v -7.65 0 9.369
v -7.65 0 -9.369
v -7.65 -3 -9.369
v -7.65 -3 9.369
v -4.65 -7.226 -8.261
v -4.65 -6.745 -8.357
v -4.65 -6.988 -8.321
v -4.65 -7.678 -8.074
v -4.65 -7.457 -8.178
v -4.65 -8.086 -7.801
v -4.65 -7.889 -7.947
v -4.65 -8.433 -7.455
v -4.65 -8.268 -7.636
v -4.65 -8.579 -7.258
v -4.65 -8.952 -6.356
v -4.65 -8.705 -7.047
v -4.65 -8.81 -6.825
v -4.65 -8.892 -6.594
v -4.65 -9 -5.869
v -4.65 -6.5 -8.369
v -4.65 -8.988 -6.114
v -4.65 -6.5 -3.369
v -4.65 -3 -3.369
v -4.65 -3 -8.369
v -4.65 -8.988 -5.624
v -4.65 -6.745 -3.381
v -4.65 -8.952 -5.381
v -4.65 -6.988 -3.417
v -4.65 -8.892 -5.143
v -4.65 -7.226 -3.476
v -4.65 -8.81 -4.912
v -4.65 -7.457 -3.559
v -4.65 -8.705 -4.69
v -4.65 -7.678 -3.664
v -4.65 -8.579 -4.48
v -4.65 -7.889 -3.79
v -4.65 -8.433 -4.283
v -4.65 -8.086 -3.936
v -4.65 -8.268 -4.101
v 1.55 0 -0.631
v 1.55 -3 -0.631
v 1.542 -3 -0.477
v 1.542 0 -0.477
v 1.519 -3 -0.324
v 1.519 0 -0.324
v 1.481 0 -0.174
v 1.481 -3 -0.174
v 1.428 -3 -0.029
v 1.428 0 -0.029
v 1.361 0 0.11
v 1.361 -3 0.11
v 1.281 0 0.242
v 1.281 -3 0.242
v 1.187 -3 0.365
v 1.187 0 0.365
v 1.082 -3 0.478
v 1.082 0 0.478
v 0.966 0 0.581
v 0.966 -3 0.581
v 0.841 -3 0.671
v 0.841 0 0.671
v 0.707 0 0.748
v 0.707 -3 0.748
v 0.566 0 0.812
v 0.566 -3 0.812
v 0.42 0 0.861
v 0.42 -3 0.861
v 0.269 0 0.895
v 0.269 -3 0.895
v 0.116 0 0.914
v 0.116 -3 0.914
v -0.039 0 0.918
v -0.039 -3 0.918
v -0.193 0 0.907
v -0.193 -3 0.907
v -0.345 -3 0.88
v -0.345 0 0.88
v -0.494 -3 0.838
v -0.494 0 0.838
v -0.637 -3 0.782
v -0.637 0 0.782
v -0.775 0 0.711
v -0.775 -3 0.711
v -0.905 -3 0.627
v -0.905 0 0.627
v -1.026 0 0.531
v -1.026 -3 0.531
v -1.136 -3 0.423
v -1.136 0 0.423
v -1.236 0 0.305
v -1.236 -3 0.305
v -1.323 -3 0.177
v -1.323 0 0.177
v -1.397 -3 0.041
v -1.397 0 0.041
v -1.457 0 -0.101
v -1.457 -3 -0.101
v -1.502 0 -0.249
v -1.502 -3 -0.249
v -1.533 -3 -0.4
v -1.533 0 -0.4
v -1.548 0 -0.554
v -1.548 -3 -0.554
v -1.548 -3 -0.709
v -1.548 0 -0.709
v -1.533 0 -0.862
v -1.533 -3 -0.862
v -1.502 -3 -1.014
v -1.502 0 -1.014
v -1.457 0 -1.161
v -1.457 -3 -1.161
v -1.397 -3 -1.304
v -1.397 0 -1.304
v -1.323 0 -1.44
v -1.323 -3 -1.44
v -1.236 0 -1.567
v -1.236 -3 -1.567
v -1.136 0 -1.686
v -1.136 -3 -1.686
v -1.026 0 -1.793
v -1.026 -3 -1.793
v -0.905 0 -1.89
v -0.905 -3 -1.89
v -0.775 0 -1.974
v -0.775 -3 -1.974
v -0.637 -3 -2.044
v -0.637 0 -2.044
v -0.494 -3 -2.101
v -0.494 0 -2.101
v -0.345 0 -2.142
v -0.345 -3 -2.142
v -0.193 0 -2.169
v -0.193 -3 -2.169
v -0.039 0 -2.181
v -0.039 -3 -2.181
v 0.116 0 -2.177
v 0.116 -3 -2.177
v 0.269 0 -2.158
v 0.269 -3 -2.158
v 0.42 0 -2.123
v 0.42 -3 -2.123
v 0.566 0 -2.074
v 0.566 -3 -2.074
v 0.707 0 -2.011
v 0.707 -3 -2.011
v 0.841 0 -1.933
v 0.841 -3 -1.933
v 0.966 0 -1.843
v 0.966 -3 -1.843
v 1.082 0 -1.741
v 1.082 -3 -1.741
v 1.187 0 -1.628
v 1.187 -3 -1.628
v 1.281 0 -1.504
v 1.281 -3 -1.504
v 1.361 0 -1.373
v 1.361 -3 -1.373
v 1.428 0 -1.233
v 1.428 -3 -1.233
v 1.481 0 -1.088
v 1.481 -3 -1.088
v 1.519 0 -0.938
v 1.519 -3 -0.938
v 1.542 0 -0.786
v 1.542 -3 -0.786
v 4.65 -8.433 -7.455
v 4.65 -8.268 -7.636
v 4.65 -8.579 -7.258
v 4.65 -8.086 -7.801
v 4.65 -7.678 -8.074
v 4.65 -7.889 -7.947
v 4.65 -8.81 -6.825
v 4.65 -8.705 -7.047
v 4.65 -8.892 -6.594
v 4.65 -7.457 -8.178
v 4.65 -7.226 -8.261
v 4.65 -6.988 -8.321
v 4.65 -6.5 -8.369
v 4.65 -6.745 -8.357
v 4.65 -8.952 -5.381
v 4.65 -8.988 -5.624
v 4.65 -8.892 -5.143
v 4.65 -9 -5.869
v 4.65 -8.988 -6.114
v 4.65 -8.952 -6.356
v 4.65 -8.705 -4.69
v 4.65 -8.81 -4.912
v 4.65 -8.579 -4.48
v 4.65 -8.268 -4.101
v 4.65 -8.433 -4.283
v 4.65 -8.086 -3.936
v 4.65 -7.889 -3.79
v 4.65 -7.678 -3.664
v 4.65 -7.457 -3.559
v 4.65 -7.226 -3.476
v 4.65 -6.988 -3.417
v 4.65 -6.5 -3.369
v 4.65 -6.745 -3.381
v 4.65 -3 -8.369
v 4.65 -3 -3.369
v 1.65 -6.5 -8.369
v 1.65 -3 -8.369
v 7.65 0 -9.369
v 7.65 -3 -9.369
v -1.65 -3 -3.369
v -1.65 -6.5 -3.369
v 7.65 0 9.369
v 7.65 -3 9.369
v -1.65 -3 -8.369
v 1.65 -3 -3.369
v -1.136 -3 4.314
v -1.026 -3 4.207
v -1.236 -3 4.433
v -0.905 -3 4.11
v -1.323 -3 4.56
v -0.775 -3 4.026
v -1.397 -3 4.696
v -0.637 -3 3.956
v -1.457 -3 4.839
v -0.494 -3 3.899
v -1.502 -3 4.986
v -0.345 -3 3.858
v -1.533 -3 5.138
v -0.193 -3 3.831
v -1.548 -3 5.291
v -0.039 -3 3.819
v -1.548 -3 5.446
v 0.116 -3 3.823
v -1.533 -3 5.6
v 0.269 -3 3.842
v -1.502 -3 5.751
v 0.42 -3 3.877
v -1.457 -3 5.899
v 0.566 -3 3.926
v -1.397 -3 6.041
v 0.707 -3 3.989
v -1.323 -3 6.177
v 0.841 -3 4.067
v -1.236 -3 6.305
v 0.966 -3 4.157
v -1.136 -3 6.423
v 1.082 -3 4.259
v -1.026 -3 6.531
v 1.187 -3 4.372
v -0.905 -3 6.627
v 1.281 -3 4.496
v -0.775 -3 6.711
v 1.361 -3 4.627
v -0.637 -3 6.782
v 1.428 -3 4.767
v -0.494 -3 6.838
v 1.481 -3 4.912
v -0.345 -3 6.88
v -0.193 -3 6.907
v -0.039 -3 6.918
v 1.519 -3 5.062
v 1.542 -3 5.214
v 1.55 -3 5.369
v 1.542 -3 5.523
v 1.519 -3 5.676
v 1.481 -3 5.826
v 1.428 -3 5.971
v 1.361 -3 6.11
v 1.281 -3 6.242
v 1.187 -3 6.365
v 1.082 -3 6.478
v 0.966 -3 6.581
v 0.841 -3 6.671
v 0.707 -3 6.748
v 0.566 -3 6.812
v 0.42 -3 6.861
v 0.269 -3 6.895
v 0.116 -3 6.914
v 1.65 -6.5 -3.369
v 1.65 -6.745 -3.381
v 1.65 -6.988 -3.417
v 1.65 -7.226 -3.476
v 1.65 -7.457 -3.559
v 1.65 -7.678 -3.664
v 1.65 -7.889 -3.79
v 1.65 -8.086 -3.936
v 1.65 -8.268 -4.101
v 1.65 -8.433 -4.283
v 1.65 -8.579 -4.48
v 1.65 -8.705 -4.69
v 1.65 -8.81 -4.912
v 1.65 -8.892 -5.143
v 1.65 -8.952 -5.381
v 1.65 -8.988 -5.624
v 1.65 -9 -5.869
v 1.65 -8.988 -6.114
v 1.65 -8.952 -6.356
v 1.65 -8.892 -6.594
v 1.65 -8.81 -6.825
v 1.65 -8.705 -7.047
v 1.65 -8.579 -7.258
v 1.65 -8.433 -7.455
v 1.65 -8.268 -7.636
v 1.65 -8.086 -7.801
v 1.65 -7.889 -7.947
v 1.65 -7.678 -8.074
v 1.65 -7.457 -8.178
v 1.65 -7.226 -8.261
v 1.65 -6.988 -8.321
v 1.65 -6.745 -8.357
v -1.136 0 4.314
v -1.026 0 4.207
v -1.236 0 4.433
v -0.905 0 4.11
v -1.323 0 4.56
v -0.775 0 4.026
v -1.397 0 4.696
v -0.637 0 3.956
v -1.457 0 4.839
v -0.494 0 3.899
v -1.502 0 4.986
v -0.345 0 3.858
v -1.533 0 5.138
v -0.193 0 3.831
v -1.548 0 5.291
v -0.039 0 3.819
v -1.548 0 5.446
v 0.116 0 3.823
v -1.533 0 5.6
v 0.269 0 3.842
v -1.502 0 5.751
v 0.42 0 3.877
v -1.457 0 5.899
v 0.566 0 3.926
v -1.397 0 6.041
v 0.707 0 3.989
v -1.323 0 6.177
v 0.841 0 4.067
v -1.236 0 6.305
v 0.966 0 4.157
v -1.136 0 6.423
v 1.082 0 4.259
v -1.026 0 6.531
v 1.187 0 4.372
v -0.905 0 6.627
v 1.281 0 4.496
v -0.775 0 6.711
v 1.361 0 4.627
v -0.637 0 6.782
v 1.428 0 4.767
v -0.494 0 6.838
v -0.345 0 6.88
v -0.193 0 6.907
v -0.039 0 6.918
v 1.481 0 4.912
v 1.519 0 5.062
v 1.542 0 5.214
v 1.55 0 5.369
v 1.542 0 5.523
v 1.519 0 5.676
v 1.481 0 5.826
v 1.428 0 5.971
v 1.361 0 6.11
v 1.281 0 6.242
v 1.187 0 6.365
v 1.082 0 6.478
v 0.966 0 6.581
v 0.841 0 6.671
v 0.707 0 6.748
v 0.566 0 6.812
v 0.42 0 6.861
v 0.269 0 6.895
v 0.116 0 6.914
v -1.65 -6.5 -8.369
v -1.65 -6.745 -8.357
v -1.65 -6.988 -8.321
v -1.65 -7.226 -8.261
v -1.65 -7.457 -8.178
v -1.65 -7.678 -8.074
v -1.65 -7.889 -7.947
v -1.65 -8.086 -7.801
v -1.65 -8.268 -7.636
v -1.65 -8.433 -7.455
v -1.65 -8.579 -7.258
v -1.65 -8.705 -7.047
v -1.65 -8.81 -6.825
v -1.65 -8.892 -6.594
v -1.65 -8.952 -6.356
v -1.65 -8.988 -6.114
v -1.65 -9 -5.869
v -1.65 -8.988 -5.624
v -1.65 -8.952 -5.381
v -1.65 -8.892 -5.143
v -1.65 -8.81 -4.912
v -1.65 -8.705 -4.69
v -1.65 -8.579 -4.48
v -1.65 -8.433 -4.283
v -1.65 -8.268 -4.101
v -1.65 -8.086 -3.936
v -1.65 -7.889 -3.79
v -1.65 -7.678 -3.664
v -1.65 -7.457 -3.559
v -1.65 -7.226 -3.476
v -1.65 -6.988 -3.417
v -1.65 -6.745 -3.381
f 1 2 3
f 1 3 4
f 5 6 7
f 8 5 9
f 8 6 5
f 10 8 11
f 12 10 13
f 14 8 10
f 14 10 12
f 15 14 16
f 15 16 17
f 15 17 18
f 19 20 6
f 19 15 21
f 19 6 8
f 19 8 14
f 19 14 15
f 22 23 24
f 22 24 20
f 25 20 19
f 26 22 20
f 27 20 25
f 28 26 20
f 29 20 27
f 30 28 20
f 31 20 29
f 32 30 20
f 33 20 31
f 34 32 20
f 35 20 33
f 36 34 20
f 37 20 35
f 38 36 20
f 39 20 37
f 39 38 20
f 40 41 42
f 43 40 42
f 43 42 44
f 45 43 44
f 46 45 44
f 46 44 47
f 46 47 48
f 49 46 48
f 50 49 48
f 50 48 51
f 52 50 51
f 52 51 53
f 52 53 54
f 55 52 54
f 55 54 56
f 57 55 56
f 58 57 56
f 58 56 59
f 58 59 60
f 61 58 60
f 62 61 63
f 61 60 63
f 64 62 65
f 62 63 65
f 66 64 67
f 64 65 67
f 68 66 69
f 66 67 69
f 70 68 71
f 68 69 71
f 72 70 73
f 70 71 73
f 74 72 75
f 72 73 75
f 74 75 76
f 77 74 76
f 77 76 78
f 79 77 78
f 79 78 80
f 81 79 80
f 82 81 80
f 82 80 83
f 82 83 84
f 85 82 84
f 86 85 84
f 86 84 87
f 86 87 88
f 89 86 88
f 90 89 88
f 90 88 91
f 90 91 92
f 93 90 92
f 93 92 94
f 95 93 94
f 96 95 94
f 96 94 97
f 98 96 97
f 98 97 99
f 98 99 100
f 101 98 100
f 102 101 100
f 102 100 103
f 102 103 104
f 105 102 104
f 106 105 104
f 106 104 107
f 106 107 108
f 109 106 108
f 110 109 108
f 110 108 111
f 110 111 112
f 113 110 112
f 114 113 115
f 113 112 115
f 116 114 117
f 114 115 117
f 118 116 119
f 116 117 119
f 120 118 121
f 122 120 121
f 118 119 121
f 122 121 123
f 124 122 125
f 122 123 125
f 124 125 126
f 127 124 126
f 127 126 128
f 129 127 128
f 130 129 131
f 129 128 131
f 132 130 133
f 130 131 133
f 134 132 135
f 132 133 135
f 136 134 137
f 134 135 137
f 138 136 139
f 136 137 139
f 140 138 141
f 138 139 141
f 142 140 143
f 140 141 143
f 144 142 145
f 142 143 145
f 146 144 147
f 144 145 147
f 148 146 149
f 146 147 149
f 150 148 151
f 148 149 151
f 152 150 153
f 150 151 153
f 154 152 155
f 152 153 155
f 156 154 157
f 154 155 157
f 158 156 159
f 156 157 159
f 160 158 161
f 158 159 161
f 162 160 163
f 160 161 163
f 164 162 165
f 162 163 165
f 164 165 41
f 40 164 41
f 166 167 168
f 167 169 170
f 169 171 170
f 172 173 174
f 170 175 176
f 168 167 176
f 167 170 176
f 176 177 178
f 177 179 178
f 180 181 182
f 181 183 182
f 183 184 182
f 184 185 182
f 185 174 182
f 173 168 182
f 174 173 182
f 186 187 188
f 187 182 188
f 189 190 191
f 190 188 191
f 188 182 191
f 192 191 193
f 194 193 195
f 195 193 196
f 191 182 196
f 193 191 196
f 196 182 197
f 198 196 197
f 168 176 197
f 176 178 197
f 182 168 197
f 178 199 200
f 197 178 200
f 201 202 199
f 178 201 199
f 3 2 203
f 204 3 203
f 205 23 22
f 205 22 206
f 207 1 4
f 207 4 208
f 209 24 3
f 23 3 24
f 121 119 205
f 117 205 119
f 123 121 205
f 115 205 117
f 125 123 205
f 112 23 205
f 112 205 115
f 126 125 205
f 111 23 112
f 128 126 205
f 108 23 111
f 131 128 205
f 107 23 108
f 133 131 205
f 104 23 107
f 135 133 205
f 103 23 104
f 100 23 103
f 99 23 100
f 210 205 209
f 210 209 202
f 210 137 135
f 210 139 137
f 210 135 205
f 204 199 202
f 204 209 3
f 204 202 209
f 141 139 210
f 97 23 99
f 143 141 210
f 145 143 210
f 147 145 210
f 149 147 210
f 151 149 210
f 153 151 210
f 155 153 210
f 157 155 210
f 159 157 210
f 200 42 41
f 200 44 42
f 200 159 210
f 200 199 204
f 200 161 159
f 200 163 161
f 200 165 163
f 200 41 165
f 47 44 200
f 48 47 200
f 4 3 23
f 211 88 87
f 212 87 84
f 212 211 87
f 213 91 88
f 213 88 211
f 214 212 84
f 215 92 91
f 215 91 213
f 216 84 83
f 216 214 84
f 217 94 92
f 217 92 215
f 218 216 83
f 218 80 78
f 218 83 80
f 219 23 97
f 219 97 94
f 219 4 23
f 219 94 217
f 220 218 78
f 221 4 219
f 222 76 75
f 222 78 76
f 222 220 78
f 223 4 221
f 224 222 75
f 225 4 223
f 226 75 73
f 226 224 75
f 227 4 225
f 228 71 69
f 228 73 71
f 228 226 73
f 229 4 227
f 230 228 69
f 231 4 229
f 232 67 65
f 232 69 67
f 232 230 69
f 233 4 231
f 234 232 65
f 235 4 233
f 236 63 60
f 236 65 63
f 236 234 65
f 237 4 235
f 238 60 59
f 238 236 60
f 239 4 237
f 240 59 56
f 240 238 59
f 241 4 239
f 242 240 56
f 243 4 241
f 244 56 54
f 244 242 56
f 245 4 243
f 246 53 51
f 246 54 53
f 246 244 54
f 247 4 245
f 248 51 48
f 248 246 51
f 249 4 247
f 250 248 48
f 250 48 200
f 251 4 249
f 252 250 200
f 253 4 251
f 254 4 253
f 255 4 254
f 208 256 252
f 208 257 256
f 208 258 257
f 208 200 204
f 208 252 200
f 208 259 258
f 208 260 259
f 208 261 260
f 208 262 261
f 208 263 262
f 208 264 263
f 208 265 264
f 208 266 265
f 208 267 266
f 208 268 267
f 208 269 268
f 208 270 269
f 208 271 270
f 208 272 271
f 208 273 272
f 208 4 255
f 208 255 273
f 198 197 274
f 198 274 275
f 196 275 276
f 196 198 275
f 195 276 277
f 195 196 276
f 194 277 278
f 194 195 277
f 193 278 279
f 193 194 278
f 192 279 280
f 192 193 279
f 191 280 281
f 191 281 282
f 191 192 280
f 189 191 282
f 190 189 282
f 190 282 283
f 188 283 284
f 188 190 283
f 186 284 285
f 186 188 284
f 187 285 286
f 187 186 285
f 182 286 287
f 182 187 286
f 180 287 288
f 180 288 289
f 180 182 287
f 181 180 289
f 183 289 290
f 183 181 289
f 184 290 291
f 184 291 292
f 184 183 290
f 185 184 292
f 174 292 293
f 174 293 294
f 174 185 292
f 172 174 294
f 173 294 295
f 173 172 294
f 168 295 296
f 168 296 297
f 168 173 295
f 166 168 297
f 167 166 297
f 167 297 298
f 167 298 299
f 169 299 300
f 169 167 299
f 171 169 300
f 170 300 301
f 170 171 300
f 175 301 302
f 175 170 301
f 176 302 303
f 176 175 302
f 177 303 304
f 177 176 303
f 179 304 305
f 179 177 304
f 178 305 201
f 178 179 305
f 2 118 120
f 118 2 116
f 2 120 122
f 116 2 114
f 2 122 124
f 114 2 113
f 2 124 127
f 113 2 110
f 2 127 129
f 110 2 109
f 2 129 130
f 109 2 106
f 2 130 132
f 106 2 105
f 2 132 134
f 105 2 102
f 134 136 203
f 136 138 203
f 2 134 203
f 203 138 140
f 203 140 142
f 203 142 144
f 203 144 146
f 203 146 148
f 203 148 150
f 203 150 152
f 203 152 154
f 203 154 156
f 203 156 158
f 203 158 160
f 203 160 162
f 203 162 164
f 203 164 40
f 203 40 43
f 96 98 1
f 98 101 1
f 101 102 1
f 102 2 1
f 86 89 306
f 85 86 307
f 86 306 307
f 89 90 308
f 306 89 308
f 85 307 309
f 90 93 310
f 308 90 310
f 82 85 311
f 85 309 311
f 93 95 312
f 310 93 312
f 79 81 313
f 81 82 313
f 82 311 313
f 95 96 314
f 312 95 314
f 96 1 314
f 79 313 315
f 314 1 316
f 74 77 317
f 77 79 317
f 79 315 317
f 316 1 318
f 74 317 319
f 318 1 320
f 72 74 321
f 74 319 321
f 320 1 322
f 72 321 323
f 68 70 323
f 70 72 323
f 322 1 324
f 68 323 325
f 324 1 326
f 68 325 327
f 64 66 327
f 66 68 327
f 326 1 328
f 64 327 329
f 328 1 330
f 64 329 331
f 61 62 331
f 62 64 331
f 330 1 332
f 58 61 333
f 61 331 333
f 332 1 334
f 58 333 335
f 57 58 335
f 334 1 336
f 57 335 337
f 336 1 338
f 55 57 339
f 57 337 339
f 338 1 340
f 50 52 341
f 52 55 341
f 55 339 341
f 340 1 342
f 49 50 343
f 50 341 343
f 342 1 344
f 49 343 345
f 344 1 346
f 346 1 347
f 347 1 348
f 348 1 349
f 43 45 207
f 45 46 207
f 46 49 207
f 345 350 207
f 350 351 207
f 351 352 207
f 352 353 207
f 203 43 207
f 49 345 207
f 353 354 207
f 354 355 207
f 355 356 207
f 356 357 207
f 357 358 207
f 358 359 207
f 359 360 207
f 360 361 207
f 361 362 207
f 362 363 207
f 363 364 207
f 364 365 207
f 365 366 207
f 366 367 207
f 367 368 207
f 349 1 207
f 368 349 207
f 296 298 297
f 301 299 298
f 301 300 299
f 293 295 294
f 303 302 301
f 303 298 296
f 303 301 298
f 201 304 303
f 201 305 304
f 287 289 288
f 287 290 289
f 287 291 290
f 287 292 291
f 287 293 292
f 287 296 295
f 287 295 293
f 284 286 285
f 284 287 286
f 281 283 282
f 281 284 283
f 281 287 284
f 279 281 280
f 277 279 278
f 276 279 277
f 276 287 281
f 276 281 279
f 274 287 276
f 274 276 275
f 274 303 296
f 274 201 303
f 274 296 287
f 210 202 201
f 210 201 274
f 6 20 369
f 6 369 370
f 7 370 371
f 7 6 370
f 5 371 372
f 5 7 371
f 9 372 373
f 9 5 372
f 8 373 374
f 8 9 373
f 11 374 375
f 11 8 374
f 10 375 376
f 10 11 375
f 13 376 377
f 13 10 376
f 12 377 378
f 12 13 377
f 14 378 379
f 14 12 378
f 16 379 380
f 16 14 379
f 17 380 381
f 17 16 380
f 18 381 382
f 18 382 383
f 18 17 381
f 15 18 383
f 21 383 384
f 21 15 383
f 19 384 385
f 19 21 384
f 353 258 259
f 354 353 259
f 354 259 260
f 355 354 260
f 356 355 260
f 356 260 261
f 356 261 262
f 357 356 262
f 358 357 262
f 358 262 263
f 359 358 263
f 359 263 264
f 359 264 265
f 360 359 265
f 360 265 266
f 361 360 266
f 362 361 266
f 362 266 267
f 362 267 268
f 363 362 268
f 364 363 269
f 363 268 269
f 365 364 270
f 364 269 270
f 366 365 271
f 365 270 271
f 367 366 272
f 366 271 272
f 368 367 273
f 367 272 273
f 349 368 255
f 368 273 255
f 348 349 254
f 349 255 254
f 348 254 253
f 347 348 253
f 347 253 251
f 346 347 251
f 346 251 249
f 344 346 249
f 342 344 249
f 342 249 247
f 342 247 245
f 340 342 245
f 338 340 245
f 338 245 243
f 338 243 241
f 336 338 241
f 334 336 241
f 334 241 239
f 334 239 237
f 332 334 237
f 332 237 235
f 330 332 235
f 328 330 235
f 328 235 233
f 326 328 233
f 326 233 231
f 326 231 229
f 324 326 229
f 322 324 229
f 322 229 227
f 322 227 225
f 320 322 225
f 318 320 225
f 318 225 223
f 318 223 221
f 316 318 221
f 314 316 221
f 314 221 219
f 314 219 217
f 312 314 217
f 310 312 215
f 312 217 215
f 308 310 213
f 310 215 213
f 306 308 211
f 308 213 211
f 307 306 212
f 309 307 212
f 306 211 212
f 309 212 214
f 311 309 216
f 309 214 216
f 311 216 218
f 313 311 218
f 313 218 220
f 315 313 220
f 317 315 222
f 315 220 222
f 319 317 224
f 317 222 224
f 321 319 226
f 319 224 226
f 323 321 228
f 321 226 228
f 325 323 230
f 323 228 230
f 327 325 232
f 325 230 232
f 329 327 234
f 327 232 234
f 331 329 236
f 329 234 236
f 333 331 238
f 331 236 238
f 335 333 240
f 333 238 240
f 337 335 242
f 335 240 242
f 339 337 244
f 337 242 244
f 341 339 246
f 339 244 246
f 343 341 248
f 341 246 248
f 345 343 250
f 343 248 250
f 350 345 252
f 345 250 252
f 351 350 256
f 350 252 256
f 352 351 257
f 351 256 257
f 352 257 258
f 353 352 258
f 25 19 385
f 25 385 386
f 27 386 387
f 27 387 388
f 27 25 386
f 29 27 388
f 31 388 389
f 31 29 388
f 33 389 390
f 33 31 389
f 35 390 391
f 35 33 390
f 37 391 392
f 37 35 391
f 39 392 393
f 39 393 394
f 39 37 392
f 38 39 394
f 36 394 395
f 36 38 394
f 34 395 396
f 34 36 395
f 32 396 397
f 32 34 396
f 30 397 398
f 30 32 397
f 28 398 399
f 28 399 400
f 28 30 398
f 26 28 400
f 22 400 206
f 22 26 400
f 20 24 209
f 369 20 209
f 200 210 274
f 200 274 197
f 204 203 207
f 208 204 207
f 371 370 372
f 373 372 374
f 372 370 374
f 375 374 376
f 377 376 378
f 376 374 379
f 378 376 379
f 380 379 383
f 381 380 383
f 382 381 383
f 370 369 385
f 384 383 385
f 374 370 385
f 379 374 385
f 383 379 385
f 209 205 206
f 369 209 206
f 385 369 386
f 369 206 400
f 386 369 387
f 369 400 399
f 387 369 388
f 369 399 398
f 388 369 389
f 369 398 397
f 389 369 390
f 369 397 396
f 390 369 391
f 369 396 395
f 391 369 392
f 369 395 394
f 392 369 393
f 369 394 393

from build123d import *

# Parameters (mm, degrees)
F0_W     = 15.3
F0_H     = 18.7374445884
F1_DEPTH = 3
F2_W     = 3
F2_H     = 5
F3_DEPTH = 3.5
F5_R     = 1.55
F6_DEPTH = 5
F7_DEPTH = 3
F9_DEPTH = 3


with BuildPart() as f1:
    # F0 (on Front) → F1 (new body)
    with BuildSketch(Plane.XZ):
        Rectangle(F0_W, F0_H)
    extrude(amount=F1_DEPTH)

    # F2 (on face) → F3 (join)
    with BuildSketch(Plane.XZ.offset(3)):
        with Locations((-3.15, -5.8687222942)):
            Rectangle(F2_W, F2_H)
        with Locations((3.15, -5.8687222942)):
            Rectangle(F2_W, F2_H)
    extrude(amount=F3_DEPTH)

    # F5 (on face) → F6 (cut)
    with BuildSketch(Plane.XZ.offset(3)):
        with Locations((0, -0.6312777058)):
            Circle(F5_R)
        with Locations((0, 5.3687222942)):
            Circle(F5_R)
    extrude(amount=-F6_DEPTH, mode=Mode.SUBTRACT)

    # F4 (on face) → F7 (join)
    with BuildSketch(Plane(origin=(-4.65, 0, 0), x_dir=(0, -1, 0), z_dir=(-1, 0, 0))):
        with BuildLine():
            ThreePointArc((6.5, -8.3687222942), (8.267766953, -7.6364892472), (9, -5.8687222942))
            ThreePointArc((9, -5.8687222942), (8.267766953, -4.1009553413), (6.5, -3.3687222942))
            Line((6.5, -3.3687222942), (6.5, -8.3687222942))
        make_face()
    extrude(amount=-F7_DEPTH)

    # F8 (on face) → F9 (join)
    with BuildSketch(Plane.YZ.offset(4.65)):
        with BuildLine():
            ThreePointArc((-6.5, -8.3687222942), (-4.732233047, -7.6364892472), (-4, -5.8687222942))
            ThreePointArc((-4, -5.8687222942), (-4.732233047, -4.1009553413), (-6.5, -3.3687222942))
            Line((-6.5, -3.3687222942), (-6.5, -8.3687222942))
        make_face()
        with BuildLine():
            Line((-6.5, -8.3687222942), (-6.5, -3.3687222942))
            ThreePointArc((-6.5, -3.3687222942), (-9, -5.8687222942), (-6.5, -8.3687222942))
        make_face()
    extrude(amount=-F9_DEPTH)


solid = f1.part
